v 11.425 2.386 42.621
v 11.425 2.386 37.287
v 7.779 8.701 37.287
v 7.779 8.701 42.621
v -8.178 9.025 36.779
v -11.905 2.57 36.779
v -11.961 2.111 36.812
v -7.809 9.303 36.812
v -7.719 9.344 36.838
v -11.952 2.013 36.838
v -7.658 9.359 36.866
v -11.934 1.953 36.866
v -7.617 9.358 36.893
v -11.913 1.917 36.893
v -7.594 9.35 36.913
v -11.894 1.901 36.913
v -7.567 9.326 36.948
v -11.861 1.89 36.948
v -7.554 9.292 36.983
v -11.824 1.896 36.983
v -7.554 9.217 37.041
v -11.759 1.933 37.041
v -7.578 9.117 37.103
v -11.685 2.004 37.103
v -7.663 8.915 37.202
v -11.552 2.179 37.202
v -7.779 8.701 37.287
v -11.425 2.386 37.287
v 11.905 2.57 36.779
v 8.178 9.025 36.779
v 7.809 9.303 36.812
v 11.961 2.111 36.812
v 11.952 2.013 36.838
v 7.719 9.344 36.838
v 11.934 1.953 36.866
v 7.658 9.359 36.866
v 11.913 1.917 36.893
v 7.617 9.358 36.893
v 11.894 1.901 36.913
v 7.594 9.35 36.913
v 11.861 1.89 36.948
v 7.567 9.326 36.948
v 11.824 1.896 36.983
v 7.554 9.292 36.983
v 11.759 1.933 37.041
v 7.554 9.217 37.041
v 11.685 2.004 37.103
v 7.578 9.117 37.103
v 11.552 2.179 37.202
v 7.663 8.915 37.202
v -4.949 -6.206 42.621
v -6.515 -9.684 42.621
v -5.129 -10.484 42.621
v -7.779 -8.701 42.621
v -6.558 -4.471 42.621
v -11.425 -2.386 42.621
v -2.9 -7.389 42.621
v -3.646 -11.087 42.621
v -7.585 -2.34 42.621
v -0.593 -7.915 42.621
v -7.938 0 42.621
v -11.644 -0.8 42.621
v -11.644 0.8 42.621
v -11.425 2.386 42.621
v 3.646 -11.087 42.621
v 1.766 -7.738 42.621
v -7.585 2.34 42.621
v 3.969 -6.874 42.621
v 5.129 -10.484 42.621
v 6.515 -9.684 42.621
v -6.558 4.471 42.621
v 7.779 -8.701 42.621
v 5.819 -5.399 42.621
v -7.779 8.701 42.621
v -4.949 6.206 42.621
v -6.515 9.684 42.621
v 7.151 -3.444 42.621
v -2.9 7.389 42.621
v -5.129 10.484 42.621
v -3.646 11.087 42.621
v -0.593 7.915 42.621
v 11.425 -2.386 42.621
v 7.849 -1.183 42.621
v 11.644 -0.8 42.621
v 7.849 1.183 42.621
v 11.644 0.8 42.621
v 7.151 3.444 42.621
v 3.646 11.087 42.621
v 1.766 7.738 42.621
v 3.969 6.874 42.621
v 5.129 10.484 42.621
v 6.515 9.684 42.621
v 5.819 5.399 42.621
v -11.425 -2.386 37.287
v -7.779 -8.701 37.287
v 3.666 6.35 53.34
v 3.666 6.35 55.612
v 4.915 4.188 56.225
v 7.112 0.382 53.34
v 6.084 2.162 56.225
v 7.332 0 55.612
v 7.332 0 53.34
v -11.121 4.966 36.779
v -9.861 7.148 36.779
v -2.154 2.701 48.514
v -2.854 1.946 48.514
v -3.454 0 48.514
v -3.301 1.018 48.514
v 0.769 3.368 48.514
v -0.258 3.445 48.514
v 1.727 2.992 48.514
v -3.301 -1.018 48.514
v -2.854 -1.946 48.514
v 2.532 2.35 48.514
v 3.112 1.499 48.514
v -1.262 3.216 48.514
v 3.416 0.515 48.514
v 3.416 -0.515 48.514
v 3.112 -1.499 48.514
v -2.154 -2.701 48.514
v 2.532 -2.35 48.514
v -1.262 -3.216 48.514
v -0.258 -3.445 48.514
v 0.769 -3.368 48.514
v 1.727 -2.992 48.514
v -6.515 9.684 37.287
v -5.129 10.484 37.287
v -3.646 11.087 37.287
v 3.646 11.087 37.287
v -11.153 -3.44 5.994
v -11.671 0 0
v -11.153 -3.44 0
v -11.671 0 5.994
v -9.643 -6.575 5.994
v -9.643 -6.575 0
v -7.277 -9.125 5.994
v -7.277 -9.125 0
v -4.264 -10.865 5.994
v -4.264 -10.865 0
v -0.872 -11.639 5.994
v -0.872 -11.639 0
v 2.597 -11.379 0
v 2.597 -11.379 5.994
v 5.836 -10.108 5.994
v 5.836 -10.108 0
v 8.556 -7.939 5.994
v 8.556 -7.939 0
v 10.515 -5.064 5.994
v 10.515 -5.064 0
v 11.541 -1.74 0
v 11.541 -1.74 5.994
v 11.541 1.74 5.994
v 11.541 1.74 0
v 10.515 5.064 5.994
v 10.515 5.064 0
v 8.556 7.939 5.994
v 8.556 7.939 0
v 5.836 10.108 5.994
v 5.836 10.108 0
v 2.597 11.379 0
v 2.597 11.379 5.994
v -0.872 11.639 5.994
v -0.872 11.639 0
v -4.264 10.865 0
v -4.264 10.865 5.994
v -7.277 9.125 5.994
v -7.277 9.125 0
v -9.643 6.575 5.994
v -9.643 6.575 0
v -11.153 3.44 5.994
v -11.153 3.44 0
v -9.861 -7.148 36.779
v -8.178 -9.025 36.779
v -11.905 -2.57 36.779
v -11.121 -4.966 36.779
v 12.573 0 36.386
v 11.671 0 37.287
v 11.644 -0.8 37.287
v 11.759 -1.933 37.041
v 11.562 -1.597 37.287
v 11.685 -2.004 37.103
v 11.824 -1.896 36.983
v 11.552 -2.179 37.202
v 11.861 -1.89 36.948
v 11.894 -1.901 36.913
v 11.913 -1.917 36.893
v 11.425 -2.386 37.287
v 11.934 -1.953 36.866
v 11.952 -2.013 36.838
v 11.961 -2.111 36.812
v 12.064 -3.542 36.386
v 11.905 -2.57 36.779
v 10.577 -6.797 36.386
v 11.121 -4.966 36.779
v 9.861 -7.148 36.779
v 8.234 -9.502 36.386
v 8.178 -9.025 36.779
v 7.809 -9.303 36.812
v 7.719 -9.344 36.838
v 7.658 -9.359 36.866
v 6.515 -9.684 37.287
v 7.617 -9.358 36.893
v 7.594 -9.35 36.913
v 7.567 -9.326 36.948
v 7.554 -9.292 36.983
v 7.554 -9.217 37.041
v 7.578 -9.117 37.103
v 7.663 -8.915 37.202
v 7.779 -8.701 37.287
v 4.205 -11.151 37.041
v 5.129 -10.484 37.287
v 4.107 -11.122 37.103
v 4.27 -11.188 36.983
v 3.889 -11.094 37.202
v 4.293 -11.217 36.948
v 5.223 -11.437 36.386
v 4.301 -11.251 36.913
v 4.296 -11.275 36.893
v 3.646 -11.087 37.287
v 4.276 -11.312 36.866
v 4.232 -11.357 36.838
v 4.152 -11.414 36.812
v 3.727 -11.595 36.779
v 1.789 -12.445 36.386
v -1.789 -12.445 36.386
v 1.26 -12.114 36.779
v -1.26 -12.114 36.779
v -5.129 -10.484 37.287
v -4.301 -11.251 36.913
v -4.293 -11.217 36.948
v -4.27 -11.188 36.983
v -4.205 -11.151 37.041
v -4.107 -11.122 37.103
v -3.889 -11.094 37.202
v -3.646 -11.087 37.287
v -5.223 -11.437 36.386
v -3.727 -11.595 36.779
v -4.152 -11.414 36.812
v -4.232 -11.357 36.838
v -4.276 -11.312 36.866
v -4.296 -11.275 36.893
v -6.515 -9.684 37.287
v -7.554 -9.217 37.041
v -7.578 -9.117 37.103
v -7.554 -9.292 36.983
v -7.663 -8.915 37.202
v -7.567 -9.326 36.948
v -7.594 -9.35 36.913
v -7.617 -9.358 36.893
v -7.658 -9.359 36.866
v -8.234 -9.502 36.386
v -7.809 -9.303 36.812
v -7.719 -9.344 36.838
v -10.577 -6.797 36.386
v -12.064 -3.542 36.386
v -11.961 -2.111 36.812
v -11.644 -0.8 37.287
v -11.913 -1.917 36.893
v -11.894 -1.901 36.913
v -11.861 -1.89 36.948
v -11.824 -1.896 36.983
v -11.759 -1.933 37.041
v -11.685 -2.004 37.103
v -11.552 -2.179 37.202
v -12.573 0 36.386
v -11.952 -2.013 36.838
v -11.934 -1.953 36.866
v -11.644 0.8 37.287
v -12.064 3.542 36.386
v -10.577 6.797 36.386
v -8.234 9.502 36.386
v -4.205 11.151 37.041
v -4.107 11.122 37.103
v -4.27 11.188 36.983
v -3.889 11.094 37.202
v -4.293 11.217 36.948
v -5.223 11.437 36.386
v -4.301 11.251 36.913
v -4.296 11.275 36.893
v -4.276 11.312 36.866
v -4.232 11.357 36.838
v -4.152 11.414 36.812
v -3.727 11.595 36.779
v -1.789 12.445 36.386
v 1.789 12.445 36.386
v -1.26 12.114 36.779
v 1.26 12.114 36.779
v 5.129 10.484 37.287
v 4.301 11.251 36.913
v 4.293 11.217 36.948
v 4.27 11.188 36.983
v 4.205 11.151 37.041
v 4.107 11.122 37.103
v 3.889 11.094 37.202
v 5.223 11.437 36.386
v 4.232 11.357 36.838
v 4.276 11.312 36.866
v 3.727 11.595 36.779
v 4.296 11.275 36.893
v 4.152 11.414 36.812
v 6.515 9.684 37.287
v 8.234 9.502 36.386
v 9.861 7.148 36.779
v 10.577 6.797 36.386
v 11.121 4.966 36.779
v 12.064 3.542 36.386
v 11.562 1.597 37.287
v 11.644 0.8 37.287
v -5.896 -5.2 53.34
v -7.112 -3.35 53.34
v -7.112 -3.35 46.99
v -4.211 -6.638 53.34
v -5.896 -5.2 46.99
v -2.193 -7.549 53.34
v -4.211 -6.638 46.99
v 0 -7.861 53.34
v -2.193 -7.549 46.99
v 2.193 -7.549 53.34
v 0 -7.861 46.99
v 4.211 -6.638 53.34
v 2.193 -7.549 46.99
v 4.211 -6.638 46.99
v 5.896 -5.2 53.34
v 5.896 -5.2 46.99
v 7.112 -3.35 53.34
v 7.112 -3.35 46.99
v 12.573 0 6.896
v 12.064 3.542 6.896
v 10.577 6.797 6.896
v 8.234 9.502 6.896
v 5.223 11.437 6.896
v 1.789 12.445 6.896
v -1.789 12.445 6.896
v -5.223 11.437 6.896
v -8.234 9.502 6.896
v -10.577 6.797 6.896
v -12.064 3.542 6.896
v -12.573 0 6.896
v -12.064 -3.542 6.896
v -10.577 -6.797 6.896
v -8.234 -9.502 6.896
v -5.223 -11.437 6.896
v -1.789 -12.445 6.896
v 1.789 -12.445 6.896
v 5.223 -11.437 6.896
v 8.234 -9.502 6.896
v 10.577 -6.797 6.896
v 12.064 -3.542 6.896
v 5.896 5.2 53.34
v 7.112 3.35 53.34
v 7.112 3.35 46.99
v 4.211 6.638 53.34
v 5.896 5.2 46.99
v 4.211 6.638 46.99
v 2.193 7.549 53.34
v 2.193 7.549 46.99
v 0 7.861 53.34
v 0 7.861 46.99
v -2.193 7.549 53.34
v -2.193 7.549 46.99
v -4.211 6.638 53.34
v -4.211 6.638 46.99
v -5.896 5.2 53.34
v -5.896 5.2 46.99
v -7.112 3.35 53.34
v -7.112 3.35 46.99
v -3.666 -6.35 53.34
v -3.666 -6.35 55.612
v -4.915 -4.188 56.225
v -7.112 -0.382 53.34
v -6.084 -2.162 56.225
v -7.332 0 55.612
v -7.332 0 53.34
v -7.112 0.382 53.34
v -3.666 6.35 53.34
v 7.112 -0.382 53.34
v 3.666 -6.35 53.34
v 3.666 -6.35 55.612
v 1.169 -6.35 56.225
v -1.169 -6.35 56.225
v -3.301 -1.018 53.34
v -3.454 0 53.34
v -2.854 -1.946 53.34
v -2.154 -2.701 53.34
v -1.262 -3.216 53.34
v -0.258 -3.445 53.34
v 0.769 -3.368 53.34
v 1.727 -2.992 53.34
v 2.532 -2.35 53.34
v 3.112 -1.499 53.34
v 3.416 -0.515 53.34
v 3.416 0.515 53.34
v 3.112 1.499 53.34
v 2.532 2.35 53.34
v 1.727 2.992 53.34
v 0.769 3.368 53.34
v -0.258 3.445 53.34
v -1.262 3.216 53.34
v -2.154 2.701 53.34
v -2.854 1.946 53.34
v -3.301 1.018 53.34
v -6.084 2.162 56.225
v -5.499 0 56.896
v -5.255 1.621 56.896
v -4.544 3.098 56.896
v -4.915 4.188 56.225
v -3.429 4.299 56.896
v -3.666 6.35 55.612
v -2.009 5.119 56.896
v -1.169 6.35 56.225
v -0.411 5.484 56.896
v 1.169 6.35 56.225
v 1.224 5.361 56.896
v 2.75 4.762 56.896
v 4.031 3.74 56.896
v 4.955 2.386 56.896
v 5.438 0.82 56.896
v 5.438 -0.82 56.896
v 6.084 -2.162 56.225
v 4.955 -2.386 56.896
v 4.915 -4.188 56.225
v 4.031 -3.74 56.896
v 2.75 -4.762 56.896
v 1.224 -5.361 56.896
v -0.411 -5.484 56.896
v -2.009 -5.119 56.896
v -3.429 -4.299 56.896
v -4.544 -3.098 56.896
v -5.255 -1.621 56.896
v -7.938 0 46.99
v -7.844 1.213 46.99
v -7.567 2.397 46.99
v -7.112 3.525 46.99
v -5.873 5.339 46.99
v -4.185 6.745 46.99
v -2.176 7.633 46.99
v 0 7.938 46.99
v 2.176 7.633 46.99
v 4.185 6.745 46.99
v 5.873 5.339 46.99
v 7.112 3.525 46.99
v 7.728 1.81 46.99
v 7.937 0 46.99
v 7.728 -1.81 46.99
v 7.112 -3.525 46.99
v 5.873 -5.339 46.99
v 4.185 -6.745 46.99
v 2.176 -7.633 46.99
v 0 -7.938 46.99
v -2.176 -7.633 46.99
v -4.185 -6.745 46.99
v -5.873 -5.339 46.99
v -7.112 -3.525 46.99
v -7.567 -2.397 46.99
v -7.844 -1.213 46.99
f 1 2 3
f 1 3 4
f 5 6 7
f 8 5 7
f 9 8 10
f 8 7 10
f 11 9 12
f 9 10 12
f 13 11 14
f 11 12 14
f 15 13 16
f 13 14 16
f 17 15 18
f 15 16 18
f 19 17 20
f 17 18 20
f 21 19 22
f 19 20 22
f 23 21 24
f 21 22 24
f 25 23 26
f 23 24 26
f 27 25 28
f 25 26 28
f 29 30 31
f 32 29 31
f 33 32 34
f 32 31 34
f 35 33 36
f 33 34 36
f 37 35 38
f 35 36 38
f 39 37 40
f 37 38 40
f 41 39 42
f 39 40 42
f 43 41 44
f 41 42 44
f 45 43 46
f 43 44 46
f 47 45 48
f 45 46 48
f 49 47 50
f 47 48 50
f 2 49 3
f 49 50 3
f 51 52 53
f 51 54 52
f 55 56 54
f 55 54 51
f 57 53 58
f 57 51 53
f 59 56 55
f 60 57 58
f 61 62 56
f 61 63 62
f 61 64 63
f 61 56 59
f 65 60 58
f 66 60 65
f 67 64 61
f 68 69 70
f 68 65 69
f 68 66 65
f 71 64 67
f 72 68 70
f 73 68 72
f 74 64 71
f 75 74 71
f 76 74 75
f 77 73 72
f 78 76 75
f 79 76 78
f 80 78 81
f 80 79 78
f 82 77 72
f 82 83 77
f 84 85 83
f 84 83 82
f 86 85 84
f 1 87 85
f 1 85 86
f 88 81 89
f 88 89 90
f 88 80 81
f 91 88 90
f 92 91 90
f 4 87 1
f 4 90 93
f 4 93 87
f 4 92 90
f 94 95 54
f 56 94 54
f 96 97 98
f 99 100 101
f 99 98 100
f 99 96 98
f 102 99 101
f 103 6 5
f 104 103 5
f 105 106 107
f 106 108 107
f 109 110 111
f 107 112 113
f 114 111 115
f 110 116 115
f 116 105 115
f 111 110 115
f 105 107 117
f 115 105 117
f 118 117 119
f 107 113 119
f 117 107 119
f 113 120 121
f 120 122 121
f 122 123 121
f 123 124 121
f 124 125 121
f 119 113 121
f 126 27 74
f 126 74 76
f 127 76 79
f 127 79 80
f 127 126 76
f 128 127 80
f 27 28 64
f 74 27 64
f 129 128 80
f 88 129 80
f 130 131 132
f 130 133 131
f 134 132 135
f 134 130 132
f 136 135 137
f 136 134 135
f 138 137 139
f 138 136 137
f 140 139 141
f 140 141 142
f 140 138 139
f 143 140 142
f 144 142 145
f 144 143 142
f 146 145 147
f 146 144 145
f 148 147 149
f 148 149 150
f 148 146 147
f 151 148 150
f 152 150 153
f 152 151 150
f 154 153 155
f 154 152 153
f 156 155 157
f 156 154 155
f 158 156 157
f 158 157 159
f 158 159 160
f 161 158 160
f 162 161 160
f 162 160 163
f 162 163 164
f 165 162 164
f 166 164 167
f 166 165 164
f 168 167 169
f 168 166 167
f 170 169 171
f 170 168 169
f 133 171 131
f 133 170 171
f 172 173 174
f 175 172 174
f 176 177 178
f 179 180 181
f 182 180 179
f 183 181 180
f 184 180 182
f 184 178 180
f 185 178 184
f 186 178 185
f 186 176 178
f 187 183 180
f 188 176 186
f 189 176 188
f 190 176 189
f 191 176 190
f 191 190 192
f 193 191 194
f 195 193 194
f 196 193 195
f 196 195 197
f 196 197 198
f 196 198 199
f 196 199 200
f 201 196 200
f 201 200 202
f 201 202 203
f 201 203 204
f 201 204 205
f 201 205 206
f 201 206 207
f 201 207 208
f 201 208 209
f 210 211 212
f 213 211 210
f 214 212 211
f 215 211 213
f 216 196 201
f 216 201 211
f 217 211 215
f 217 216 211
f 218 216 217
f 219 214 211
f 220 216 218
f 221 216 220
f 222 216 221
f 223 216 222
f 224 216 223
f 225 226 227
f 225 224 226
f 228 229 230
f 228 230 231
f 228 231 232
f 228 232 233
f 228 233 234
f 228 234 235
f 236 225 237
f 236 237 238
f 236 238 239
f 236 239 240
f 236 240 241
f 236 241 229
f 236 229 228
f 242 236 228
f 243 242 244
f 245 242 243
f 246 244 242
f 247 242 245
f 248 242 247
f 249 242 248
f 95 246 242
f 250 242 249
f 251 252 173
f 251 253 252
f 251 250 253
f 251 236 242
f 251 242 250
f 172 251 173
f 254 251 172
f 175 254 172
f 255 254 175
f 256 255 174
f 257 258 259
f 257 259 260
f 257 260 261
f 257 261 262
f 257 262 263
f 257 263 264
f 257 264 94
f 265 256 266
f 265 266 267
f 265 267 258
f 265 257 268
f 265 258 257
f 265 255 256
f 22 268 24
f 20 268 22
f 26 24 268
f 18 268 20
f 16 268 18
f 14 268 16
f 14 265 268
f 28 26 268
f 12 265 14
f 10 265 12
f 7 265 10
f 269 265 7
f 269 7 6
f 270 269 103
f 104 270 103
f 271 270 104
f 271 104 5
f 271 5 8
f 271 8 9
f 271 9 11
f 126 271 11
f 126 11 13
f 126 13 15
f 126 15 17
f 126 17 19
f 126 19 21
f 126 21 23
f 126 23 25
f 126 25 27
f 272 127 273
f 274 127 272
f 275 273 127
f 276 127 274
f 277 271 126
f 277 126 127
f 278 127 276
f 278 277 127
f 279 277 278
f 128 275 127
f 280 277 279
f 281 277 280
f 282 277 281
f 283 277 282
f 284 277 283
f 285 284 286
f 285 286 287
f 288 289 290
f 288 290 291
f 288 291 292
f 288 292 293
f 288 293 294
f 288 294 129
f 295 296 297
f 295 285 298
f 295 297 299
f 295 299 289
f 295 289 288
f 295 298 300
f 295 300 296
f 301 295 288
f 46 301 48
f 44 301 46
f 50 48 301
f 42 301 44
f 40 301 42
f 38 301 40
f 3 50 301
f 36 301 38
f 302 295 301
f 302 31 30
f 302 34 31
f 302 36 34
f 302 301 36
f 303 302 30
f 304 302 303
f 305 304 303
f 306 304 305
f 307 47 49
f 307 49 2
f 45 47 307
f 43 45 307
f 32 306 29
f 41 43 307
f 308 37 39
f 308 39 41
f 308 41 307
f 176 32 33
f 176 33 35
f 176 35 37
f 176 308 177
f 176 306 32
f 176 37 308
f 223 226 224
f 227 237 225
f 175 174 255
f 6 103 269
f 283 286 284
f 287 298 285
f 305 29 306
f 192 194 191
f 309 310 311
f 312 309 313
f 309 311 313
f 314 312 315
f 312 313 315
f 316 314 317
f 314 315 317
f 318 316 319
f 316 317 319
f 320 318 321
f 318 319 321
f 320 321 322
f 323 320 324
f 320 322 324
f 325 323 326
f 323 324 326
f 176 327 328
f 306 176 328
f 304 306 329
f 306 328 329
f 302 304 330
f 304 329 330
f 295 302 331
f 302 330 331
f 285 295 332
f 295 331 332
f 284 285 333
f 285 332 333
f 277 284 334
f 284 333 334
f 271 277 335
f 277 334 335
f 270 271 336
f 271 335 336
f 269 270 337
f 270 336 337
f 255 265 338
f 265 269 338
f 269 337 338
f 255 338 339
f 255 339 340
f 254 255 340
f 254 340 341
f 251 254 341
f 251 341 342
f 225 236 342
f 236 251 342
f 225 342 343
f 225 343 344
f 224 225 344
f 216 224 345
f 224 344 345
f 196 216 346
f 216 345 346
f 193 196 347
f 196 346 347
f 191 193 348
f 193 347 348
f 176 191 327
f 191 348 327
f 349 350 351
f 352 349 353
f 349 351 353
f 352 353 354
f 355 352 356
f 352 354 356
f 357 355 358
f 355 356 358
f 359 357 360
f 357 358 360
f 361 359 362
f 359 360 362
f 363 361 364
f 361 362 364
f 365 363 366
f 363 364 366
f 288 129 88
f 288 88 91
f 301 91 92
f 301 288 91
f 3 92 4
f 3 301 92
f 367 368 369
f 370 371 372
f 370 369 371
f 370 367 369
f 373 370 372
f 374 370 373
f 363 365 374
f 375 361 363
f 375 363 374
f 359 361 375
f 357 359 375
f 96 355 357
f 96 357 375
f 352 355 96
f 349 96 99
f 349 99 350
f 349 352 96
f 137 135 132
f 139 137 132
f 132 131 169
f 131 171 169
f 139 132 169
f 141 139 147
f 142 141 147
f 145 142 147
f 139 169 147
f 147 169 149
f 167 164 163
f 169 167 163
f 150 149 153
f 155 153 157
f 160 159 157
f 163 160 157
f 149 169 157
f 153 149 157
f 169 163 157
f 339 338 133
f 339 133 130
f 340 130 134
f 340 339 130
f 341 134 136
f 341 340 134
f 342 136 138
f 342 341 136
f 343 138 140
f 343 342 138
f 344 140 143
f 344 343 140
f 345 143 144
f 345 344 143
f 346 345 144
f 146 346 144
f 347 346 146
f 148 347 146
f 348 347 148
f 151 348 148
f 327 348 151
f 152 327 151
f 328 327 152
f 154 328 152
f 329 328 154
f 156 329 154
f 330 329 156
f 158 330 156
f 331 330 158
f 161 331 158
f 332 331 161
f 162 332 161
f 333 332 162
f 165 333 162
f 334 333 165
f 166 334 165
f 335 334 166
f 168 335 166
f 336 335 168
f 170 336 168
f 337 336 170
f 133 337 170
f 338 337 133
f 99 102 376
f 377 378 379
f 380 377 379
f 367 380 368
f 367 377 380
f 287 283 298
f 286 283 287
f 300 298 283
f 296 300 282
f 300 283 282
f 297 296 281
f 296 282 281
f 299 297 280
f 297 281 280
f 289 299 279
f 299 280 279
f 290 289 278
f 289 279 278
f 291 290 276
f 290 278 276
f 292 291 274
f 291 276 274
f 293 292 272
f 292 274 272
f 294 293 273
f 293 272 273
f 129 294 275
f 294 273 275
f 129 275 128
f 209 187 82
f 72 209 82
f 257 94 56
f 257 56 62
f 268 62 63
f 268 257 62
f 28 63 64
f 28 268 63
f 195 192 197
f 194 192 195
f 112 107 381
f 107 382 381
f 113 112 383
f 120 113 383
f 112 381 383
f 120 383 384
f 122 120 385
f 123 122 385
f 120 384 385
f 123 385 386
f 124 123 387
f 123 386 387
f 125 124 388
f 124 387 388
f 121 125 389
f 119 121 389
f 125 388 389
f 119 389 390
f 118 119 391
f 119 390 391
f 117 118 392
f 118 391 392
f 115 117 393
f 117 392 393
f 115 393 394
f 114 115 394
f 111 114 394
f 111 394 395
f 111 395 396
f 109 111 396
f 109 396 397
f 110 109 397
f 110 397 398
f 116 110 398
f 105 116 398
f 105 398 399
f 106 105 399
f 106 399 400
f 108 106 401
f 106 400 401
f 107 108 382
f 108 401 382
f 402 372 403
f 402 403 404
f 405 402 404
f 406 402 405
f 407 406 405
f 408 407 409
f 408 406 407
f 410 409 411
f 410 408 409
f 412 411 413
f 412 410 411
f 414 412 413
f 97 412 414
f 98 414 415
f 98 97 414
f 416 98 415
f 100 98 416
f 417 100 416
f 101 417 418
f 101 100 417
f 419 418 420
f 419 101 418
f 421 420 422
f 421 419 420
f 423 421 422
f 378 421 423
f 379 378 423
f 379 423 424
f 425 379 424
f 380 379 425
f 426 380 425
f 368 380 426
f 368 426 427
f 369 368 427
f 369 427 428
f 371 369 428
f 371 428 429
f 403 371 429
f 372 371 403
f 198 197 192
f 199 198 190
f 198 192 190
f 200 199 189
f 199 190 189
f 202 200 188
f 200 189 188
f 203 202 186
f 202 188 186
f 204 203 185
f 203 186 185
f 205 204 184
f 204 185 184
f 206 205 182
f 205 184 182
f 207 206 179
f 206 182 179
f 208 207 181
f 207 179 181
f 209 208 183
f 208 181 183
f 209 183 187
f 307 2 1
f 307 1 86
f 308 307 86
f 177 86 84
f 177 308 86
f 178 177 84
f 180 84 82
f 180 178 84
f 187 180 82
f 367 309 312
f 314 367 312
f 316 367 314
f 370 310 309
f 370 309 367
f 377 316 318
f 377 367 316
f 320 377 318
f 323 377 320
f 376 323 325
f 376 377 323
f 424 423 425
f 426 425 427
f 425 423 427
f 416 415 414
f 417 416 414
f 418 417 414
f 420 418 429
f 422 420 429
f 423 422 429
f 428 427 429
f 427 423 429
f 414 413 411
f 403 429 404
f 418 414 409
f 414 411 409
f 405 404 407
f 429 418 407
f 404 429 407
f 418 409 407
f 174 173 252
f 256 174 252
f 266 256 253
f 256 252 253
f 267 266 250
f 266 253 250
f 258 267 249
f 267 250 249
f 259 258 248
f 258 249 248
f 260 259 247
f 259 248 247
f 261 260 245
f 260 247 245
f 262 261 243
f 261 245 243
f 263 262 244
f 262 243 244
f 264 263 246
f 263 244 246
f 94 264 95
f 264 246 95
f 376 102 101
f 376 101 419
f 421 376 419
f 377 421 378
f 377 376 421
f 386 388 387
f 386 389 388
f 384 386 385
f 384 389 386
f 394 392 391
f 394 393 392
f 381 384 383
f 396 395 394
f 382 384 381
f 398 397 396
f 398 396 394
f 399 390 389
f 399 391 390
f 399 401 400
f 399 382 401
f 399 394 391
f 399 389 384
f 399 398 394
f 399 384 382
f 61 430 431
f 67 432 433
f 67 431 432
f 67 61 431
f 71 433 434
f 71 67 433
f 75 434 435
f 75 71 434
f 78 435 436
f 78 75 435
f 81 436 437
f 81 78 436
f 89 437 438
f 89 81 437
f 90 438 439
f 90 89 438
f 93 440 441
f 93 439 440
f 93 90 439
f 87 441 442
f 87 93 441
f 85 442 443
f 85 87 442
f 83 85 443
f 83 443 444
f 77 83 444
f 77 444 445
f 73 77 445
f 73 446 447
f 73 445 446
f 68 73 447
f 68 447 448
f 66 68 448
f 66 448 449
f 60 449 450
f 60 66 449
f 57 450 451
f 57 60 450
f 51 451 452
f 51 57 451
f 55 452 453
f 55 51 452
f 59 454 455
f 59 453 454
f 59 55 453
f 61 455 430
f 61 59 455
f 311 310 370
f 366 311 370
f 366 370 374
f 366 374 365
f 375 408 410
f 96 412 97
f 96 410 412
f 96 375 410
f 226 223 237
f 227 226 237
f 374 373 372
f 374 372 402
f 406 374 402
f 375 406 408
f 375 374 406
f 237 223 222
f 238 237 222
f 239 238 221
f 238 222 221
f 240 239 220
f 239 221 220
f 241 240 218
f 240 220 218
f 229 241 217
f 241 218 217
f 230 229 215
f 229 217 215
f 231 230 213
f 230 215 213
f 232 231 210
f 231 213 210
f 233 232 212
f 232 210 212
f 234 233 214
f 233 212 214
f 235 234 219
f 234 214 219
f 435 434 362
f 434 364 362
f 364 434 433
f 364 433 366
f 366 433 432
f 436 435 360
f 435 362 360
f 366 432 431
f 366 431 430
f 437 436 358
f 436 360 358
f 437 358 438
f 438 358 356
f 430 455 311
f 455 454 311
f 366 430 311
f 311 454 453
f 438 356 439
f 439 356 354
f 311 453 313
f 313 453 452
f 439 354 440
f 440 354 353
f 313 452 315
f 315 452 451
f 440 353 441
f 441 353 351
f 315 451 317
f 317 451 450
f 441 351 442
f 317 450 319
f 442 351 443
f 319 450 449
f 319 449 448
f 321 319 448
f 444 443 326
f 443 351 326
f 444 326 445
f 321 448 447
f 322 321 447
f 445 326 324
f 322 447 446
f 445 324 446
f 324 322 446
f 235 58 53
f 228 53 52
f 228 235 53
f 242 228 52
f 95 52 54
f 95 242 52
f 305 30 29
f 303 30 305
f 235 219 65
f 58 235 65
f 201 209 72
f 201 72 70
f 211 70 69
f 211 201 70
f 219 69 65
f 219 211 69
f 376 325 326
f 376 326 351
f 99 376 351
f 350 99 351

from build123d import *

# Parameters (mm, degrees)
SKETCH1_R           = 12.573
EXTRUDE1_DEPTH      = 42.6212
CUT_EXTRUDE1_DEPTH  = 15.0876
SKETCH12_W          = 10.7188
SKETCH12_H          = 7.9375
S2D0011_W           = 3.4544
S2D0011_H           = 4.826
CUT_EXTRUDE10_DEPTH = 6.35
EXTRUDE2_DEPTH      = 3.556
CIRPATTERN2_COUNT   = 6
SKETCH18_W          = 6.35
SKETCH18_H          = 0.0762


with BuildPart() as part:
    # Sketch1 → Extrude1 (new body)
    with BuildSketch(Plane.XY):
        Circle(SKETCH1_R)
    extrude(amount=EXTRUDE1_DEPTH)

    # Sketch2 → Cut-Extrude1 (cut, symmetric)
    with BuildSketch(Plane(origin=(0, 0, 0), x_dir=(0, 0, 1), z_dir=(1, 0, 0))):
        with BuildLine():
            Line((36.7792, 12.573), (36.7792, 11.5951))
            ThreePointArc((36.7792, 11.5951), (36.927989755, 11.235889755), (37.2872, 11.0871))
            Line((37.2872, 11.0871), (42.6212, 11.0871))
            Line((42.6212, 11.0871), (42.6212, 12.573))
            Line((42.6212, 12.573), (36.7792, 12.573))
        make_face()
    cut_extrude1 = extrude(amount=CUT_EXTRUDE1_DEPTH, both=True, mode=Mode.SUBTRACT)

    # Sketch10 → Cut-Revolve1 (revolve, cut)
    with BuildSketch(Plane(origin=(0, 0, 0), x_dir=(0, 0, -1), z_dir=(1, 0, 0)), mode=Mode.PRIVATE) as cut_revolve1_sk:
        Polygon((-42.6212, 11.6713), (-37.2872, 11.6713), (-36.3855, 12.573), (-42.6212, 12.573), align=None)
    revolve(cut_revolve1_sk.sketch.rotate(Axis((0, 0, 42.424985), (0, 0, -1)), 90), axis=Axis((0, 0, 42.424985), (0, 0, -1)), mode=Mode.SUBTRACT)  # turned: the seam where the file's is

    # Sketch11 → Cut-Revolve2 (revolve, cut)
    with BuildSketch(Plane(origin=(0, 0, 0), x_dir=(0, 0, 1), z_dir=(1, 0, 0)), mode=Mode.PRIVATE) as cut_revolve2_sk:
        Polygon((0, 11.6713), (5.9944, 11.6713), (6.8961, 12.573), (0, 12.573), align=None)
    revolve(cut_revolve2_sk.sketch.rotate(Axis((0, 0, -0.344805), (0, 0, 1)), 270), axis=Axis((0, 0, -0.344805), (0, 0, 1)), mode=Mode.SUBTRACT)  # turned: the seam where the file's is

    # Sketch12 → Revolve1 (revolve)
    with BuildSketch(Plane(origin=(0, 0, 0), x_dir=(0, 0, -1), z_dir=(1, 0, 0)), mode=Mode.PRIVATE) as revolve1_sk:
        with Locations((-47.9806, 3.96875)):
            Rectangle(SKETCH12_W, SKETCH12_H)
    revolve(revolve1_sk.sketch.rotate(Axis((0, 0, 53.76799), (0, 0, -1)), 270), axis=Axis((0, 0, 53.76799), (0, 0, -1)))  # turned: the seam where the file's is

    # S2D0011 → Cut-Revolve3 (revolve, cut)
    with BuildSketch(Plane(origin=(-3.4544, 0, 53.213), x_dir=(-1, 0, 0), z_dir=(0, 1, 0))):
        with Locations((-1.7272, -2.286)):
            Rectangle(S2D0011_W, S2D0011_H)
    revolve(axis=Axis((0, 0, 27.017003875), (0, 0, 1)), mode=Mode.SUBTRACT)

    # Sketch15 → Cut-Extrude10 (cut)
    with BuildSketch(Plane.YX.offset(-53.34)):
        with BuildLine():
            Line((-3.524679028, 7.112), (3.524679028, 7.112))
            ThreePointArc((3.524679028, 7.112), (0, 7.9375), (-3.524679028, 7.112))
        make_face()
        with BuildLine():
            Line((-3.524679028, -7.112), (3.524679028, -7.112))
            ThreePointArc((3.524679028, -7.112), (0, -7.9375), (-3.524679028, -7.112))
        make_face()
    extrude(amount=CUT_EXTRUDE10_DEPTH, mode=Mode.SUBTRACT)

    # Sketch16 → Extrude2 (add)
    with BuildSketch(Plane.XY.offset(53.34)):
        Polygon((-3.666174209, 6.35), (3.666174209, 6.35), (7.332348419, 0), (3.666174209, -6.35), (-3.666174209, -6.35), (-7.332348419, 0), align=None)
    extrude(amount=EXTRUDE2_DEPTH)

    # Sketch17 → Cut-Revolve4 (revolve, cut)
    with BuildSketch(Plane(origin=(0, 0, 0), x_dir=(1, 0, 0), z_dir=(0, 1, 0)), mode=Mode.PRIVATE) as cut_revolve4_sk:
        Polygon((5.4991, -56.896), (7.332348419, -55.612345638), (7.332348419, -56.896), align=None)
    revolve(cut_revolve4_sk.sketch.rotate(Axis((0, 0, 56.833182718), (0, 0, -1)), 180), axis=Axis((0, 0, 56.833182718), (0, 0, -1)), mode=Mode.SUBTRACT)  # turned: the seam where the file's is

    # CirPattern2: Cut-Extrude1 ×6 about axis
    cirpattern2_axis = Axis((0, 0, 0), (0, 0, 1))
    for i in range(1, CIRPATTERN2_COUNT):
        add(cut_extrude1.rotate(cirpattern2_axis, i * 360 / CIRPATTERN2_COUNT), mode=Mode.SUBTRACT)

    # Sketch18 → Cut-Revolve5 (revolve, cut)
    with BuildSketch(Plane(origin=(0, 0, 0), x_dir=(0, 0, -1), z_dir=(1, 0, 0)), mode=Mode.PRIVATE) as cut_revolve5_sk:
        with Locations((-50.165, 7.8994)):
            Rectangle(SKETCH18_W, SKETCH18_H)
    revolve(cut_revolve5_sk.sketch.rotate(Axis((0, 0, 0), (0, 0, 1)), 90), axis=Axis((0, 0, 0), (0, 0, 1)), mode=Mode.SUBTRACT)  # turned: the seam where the file's is


solid = part.part
